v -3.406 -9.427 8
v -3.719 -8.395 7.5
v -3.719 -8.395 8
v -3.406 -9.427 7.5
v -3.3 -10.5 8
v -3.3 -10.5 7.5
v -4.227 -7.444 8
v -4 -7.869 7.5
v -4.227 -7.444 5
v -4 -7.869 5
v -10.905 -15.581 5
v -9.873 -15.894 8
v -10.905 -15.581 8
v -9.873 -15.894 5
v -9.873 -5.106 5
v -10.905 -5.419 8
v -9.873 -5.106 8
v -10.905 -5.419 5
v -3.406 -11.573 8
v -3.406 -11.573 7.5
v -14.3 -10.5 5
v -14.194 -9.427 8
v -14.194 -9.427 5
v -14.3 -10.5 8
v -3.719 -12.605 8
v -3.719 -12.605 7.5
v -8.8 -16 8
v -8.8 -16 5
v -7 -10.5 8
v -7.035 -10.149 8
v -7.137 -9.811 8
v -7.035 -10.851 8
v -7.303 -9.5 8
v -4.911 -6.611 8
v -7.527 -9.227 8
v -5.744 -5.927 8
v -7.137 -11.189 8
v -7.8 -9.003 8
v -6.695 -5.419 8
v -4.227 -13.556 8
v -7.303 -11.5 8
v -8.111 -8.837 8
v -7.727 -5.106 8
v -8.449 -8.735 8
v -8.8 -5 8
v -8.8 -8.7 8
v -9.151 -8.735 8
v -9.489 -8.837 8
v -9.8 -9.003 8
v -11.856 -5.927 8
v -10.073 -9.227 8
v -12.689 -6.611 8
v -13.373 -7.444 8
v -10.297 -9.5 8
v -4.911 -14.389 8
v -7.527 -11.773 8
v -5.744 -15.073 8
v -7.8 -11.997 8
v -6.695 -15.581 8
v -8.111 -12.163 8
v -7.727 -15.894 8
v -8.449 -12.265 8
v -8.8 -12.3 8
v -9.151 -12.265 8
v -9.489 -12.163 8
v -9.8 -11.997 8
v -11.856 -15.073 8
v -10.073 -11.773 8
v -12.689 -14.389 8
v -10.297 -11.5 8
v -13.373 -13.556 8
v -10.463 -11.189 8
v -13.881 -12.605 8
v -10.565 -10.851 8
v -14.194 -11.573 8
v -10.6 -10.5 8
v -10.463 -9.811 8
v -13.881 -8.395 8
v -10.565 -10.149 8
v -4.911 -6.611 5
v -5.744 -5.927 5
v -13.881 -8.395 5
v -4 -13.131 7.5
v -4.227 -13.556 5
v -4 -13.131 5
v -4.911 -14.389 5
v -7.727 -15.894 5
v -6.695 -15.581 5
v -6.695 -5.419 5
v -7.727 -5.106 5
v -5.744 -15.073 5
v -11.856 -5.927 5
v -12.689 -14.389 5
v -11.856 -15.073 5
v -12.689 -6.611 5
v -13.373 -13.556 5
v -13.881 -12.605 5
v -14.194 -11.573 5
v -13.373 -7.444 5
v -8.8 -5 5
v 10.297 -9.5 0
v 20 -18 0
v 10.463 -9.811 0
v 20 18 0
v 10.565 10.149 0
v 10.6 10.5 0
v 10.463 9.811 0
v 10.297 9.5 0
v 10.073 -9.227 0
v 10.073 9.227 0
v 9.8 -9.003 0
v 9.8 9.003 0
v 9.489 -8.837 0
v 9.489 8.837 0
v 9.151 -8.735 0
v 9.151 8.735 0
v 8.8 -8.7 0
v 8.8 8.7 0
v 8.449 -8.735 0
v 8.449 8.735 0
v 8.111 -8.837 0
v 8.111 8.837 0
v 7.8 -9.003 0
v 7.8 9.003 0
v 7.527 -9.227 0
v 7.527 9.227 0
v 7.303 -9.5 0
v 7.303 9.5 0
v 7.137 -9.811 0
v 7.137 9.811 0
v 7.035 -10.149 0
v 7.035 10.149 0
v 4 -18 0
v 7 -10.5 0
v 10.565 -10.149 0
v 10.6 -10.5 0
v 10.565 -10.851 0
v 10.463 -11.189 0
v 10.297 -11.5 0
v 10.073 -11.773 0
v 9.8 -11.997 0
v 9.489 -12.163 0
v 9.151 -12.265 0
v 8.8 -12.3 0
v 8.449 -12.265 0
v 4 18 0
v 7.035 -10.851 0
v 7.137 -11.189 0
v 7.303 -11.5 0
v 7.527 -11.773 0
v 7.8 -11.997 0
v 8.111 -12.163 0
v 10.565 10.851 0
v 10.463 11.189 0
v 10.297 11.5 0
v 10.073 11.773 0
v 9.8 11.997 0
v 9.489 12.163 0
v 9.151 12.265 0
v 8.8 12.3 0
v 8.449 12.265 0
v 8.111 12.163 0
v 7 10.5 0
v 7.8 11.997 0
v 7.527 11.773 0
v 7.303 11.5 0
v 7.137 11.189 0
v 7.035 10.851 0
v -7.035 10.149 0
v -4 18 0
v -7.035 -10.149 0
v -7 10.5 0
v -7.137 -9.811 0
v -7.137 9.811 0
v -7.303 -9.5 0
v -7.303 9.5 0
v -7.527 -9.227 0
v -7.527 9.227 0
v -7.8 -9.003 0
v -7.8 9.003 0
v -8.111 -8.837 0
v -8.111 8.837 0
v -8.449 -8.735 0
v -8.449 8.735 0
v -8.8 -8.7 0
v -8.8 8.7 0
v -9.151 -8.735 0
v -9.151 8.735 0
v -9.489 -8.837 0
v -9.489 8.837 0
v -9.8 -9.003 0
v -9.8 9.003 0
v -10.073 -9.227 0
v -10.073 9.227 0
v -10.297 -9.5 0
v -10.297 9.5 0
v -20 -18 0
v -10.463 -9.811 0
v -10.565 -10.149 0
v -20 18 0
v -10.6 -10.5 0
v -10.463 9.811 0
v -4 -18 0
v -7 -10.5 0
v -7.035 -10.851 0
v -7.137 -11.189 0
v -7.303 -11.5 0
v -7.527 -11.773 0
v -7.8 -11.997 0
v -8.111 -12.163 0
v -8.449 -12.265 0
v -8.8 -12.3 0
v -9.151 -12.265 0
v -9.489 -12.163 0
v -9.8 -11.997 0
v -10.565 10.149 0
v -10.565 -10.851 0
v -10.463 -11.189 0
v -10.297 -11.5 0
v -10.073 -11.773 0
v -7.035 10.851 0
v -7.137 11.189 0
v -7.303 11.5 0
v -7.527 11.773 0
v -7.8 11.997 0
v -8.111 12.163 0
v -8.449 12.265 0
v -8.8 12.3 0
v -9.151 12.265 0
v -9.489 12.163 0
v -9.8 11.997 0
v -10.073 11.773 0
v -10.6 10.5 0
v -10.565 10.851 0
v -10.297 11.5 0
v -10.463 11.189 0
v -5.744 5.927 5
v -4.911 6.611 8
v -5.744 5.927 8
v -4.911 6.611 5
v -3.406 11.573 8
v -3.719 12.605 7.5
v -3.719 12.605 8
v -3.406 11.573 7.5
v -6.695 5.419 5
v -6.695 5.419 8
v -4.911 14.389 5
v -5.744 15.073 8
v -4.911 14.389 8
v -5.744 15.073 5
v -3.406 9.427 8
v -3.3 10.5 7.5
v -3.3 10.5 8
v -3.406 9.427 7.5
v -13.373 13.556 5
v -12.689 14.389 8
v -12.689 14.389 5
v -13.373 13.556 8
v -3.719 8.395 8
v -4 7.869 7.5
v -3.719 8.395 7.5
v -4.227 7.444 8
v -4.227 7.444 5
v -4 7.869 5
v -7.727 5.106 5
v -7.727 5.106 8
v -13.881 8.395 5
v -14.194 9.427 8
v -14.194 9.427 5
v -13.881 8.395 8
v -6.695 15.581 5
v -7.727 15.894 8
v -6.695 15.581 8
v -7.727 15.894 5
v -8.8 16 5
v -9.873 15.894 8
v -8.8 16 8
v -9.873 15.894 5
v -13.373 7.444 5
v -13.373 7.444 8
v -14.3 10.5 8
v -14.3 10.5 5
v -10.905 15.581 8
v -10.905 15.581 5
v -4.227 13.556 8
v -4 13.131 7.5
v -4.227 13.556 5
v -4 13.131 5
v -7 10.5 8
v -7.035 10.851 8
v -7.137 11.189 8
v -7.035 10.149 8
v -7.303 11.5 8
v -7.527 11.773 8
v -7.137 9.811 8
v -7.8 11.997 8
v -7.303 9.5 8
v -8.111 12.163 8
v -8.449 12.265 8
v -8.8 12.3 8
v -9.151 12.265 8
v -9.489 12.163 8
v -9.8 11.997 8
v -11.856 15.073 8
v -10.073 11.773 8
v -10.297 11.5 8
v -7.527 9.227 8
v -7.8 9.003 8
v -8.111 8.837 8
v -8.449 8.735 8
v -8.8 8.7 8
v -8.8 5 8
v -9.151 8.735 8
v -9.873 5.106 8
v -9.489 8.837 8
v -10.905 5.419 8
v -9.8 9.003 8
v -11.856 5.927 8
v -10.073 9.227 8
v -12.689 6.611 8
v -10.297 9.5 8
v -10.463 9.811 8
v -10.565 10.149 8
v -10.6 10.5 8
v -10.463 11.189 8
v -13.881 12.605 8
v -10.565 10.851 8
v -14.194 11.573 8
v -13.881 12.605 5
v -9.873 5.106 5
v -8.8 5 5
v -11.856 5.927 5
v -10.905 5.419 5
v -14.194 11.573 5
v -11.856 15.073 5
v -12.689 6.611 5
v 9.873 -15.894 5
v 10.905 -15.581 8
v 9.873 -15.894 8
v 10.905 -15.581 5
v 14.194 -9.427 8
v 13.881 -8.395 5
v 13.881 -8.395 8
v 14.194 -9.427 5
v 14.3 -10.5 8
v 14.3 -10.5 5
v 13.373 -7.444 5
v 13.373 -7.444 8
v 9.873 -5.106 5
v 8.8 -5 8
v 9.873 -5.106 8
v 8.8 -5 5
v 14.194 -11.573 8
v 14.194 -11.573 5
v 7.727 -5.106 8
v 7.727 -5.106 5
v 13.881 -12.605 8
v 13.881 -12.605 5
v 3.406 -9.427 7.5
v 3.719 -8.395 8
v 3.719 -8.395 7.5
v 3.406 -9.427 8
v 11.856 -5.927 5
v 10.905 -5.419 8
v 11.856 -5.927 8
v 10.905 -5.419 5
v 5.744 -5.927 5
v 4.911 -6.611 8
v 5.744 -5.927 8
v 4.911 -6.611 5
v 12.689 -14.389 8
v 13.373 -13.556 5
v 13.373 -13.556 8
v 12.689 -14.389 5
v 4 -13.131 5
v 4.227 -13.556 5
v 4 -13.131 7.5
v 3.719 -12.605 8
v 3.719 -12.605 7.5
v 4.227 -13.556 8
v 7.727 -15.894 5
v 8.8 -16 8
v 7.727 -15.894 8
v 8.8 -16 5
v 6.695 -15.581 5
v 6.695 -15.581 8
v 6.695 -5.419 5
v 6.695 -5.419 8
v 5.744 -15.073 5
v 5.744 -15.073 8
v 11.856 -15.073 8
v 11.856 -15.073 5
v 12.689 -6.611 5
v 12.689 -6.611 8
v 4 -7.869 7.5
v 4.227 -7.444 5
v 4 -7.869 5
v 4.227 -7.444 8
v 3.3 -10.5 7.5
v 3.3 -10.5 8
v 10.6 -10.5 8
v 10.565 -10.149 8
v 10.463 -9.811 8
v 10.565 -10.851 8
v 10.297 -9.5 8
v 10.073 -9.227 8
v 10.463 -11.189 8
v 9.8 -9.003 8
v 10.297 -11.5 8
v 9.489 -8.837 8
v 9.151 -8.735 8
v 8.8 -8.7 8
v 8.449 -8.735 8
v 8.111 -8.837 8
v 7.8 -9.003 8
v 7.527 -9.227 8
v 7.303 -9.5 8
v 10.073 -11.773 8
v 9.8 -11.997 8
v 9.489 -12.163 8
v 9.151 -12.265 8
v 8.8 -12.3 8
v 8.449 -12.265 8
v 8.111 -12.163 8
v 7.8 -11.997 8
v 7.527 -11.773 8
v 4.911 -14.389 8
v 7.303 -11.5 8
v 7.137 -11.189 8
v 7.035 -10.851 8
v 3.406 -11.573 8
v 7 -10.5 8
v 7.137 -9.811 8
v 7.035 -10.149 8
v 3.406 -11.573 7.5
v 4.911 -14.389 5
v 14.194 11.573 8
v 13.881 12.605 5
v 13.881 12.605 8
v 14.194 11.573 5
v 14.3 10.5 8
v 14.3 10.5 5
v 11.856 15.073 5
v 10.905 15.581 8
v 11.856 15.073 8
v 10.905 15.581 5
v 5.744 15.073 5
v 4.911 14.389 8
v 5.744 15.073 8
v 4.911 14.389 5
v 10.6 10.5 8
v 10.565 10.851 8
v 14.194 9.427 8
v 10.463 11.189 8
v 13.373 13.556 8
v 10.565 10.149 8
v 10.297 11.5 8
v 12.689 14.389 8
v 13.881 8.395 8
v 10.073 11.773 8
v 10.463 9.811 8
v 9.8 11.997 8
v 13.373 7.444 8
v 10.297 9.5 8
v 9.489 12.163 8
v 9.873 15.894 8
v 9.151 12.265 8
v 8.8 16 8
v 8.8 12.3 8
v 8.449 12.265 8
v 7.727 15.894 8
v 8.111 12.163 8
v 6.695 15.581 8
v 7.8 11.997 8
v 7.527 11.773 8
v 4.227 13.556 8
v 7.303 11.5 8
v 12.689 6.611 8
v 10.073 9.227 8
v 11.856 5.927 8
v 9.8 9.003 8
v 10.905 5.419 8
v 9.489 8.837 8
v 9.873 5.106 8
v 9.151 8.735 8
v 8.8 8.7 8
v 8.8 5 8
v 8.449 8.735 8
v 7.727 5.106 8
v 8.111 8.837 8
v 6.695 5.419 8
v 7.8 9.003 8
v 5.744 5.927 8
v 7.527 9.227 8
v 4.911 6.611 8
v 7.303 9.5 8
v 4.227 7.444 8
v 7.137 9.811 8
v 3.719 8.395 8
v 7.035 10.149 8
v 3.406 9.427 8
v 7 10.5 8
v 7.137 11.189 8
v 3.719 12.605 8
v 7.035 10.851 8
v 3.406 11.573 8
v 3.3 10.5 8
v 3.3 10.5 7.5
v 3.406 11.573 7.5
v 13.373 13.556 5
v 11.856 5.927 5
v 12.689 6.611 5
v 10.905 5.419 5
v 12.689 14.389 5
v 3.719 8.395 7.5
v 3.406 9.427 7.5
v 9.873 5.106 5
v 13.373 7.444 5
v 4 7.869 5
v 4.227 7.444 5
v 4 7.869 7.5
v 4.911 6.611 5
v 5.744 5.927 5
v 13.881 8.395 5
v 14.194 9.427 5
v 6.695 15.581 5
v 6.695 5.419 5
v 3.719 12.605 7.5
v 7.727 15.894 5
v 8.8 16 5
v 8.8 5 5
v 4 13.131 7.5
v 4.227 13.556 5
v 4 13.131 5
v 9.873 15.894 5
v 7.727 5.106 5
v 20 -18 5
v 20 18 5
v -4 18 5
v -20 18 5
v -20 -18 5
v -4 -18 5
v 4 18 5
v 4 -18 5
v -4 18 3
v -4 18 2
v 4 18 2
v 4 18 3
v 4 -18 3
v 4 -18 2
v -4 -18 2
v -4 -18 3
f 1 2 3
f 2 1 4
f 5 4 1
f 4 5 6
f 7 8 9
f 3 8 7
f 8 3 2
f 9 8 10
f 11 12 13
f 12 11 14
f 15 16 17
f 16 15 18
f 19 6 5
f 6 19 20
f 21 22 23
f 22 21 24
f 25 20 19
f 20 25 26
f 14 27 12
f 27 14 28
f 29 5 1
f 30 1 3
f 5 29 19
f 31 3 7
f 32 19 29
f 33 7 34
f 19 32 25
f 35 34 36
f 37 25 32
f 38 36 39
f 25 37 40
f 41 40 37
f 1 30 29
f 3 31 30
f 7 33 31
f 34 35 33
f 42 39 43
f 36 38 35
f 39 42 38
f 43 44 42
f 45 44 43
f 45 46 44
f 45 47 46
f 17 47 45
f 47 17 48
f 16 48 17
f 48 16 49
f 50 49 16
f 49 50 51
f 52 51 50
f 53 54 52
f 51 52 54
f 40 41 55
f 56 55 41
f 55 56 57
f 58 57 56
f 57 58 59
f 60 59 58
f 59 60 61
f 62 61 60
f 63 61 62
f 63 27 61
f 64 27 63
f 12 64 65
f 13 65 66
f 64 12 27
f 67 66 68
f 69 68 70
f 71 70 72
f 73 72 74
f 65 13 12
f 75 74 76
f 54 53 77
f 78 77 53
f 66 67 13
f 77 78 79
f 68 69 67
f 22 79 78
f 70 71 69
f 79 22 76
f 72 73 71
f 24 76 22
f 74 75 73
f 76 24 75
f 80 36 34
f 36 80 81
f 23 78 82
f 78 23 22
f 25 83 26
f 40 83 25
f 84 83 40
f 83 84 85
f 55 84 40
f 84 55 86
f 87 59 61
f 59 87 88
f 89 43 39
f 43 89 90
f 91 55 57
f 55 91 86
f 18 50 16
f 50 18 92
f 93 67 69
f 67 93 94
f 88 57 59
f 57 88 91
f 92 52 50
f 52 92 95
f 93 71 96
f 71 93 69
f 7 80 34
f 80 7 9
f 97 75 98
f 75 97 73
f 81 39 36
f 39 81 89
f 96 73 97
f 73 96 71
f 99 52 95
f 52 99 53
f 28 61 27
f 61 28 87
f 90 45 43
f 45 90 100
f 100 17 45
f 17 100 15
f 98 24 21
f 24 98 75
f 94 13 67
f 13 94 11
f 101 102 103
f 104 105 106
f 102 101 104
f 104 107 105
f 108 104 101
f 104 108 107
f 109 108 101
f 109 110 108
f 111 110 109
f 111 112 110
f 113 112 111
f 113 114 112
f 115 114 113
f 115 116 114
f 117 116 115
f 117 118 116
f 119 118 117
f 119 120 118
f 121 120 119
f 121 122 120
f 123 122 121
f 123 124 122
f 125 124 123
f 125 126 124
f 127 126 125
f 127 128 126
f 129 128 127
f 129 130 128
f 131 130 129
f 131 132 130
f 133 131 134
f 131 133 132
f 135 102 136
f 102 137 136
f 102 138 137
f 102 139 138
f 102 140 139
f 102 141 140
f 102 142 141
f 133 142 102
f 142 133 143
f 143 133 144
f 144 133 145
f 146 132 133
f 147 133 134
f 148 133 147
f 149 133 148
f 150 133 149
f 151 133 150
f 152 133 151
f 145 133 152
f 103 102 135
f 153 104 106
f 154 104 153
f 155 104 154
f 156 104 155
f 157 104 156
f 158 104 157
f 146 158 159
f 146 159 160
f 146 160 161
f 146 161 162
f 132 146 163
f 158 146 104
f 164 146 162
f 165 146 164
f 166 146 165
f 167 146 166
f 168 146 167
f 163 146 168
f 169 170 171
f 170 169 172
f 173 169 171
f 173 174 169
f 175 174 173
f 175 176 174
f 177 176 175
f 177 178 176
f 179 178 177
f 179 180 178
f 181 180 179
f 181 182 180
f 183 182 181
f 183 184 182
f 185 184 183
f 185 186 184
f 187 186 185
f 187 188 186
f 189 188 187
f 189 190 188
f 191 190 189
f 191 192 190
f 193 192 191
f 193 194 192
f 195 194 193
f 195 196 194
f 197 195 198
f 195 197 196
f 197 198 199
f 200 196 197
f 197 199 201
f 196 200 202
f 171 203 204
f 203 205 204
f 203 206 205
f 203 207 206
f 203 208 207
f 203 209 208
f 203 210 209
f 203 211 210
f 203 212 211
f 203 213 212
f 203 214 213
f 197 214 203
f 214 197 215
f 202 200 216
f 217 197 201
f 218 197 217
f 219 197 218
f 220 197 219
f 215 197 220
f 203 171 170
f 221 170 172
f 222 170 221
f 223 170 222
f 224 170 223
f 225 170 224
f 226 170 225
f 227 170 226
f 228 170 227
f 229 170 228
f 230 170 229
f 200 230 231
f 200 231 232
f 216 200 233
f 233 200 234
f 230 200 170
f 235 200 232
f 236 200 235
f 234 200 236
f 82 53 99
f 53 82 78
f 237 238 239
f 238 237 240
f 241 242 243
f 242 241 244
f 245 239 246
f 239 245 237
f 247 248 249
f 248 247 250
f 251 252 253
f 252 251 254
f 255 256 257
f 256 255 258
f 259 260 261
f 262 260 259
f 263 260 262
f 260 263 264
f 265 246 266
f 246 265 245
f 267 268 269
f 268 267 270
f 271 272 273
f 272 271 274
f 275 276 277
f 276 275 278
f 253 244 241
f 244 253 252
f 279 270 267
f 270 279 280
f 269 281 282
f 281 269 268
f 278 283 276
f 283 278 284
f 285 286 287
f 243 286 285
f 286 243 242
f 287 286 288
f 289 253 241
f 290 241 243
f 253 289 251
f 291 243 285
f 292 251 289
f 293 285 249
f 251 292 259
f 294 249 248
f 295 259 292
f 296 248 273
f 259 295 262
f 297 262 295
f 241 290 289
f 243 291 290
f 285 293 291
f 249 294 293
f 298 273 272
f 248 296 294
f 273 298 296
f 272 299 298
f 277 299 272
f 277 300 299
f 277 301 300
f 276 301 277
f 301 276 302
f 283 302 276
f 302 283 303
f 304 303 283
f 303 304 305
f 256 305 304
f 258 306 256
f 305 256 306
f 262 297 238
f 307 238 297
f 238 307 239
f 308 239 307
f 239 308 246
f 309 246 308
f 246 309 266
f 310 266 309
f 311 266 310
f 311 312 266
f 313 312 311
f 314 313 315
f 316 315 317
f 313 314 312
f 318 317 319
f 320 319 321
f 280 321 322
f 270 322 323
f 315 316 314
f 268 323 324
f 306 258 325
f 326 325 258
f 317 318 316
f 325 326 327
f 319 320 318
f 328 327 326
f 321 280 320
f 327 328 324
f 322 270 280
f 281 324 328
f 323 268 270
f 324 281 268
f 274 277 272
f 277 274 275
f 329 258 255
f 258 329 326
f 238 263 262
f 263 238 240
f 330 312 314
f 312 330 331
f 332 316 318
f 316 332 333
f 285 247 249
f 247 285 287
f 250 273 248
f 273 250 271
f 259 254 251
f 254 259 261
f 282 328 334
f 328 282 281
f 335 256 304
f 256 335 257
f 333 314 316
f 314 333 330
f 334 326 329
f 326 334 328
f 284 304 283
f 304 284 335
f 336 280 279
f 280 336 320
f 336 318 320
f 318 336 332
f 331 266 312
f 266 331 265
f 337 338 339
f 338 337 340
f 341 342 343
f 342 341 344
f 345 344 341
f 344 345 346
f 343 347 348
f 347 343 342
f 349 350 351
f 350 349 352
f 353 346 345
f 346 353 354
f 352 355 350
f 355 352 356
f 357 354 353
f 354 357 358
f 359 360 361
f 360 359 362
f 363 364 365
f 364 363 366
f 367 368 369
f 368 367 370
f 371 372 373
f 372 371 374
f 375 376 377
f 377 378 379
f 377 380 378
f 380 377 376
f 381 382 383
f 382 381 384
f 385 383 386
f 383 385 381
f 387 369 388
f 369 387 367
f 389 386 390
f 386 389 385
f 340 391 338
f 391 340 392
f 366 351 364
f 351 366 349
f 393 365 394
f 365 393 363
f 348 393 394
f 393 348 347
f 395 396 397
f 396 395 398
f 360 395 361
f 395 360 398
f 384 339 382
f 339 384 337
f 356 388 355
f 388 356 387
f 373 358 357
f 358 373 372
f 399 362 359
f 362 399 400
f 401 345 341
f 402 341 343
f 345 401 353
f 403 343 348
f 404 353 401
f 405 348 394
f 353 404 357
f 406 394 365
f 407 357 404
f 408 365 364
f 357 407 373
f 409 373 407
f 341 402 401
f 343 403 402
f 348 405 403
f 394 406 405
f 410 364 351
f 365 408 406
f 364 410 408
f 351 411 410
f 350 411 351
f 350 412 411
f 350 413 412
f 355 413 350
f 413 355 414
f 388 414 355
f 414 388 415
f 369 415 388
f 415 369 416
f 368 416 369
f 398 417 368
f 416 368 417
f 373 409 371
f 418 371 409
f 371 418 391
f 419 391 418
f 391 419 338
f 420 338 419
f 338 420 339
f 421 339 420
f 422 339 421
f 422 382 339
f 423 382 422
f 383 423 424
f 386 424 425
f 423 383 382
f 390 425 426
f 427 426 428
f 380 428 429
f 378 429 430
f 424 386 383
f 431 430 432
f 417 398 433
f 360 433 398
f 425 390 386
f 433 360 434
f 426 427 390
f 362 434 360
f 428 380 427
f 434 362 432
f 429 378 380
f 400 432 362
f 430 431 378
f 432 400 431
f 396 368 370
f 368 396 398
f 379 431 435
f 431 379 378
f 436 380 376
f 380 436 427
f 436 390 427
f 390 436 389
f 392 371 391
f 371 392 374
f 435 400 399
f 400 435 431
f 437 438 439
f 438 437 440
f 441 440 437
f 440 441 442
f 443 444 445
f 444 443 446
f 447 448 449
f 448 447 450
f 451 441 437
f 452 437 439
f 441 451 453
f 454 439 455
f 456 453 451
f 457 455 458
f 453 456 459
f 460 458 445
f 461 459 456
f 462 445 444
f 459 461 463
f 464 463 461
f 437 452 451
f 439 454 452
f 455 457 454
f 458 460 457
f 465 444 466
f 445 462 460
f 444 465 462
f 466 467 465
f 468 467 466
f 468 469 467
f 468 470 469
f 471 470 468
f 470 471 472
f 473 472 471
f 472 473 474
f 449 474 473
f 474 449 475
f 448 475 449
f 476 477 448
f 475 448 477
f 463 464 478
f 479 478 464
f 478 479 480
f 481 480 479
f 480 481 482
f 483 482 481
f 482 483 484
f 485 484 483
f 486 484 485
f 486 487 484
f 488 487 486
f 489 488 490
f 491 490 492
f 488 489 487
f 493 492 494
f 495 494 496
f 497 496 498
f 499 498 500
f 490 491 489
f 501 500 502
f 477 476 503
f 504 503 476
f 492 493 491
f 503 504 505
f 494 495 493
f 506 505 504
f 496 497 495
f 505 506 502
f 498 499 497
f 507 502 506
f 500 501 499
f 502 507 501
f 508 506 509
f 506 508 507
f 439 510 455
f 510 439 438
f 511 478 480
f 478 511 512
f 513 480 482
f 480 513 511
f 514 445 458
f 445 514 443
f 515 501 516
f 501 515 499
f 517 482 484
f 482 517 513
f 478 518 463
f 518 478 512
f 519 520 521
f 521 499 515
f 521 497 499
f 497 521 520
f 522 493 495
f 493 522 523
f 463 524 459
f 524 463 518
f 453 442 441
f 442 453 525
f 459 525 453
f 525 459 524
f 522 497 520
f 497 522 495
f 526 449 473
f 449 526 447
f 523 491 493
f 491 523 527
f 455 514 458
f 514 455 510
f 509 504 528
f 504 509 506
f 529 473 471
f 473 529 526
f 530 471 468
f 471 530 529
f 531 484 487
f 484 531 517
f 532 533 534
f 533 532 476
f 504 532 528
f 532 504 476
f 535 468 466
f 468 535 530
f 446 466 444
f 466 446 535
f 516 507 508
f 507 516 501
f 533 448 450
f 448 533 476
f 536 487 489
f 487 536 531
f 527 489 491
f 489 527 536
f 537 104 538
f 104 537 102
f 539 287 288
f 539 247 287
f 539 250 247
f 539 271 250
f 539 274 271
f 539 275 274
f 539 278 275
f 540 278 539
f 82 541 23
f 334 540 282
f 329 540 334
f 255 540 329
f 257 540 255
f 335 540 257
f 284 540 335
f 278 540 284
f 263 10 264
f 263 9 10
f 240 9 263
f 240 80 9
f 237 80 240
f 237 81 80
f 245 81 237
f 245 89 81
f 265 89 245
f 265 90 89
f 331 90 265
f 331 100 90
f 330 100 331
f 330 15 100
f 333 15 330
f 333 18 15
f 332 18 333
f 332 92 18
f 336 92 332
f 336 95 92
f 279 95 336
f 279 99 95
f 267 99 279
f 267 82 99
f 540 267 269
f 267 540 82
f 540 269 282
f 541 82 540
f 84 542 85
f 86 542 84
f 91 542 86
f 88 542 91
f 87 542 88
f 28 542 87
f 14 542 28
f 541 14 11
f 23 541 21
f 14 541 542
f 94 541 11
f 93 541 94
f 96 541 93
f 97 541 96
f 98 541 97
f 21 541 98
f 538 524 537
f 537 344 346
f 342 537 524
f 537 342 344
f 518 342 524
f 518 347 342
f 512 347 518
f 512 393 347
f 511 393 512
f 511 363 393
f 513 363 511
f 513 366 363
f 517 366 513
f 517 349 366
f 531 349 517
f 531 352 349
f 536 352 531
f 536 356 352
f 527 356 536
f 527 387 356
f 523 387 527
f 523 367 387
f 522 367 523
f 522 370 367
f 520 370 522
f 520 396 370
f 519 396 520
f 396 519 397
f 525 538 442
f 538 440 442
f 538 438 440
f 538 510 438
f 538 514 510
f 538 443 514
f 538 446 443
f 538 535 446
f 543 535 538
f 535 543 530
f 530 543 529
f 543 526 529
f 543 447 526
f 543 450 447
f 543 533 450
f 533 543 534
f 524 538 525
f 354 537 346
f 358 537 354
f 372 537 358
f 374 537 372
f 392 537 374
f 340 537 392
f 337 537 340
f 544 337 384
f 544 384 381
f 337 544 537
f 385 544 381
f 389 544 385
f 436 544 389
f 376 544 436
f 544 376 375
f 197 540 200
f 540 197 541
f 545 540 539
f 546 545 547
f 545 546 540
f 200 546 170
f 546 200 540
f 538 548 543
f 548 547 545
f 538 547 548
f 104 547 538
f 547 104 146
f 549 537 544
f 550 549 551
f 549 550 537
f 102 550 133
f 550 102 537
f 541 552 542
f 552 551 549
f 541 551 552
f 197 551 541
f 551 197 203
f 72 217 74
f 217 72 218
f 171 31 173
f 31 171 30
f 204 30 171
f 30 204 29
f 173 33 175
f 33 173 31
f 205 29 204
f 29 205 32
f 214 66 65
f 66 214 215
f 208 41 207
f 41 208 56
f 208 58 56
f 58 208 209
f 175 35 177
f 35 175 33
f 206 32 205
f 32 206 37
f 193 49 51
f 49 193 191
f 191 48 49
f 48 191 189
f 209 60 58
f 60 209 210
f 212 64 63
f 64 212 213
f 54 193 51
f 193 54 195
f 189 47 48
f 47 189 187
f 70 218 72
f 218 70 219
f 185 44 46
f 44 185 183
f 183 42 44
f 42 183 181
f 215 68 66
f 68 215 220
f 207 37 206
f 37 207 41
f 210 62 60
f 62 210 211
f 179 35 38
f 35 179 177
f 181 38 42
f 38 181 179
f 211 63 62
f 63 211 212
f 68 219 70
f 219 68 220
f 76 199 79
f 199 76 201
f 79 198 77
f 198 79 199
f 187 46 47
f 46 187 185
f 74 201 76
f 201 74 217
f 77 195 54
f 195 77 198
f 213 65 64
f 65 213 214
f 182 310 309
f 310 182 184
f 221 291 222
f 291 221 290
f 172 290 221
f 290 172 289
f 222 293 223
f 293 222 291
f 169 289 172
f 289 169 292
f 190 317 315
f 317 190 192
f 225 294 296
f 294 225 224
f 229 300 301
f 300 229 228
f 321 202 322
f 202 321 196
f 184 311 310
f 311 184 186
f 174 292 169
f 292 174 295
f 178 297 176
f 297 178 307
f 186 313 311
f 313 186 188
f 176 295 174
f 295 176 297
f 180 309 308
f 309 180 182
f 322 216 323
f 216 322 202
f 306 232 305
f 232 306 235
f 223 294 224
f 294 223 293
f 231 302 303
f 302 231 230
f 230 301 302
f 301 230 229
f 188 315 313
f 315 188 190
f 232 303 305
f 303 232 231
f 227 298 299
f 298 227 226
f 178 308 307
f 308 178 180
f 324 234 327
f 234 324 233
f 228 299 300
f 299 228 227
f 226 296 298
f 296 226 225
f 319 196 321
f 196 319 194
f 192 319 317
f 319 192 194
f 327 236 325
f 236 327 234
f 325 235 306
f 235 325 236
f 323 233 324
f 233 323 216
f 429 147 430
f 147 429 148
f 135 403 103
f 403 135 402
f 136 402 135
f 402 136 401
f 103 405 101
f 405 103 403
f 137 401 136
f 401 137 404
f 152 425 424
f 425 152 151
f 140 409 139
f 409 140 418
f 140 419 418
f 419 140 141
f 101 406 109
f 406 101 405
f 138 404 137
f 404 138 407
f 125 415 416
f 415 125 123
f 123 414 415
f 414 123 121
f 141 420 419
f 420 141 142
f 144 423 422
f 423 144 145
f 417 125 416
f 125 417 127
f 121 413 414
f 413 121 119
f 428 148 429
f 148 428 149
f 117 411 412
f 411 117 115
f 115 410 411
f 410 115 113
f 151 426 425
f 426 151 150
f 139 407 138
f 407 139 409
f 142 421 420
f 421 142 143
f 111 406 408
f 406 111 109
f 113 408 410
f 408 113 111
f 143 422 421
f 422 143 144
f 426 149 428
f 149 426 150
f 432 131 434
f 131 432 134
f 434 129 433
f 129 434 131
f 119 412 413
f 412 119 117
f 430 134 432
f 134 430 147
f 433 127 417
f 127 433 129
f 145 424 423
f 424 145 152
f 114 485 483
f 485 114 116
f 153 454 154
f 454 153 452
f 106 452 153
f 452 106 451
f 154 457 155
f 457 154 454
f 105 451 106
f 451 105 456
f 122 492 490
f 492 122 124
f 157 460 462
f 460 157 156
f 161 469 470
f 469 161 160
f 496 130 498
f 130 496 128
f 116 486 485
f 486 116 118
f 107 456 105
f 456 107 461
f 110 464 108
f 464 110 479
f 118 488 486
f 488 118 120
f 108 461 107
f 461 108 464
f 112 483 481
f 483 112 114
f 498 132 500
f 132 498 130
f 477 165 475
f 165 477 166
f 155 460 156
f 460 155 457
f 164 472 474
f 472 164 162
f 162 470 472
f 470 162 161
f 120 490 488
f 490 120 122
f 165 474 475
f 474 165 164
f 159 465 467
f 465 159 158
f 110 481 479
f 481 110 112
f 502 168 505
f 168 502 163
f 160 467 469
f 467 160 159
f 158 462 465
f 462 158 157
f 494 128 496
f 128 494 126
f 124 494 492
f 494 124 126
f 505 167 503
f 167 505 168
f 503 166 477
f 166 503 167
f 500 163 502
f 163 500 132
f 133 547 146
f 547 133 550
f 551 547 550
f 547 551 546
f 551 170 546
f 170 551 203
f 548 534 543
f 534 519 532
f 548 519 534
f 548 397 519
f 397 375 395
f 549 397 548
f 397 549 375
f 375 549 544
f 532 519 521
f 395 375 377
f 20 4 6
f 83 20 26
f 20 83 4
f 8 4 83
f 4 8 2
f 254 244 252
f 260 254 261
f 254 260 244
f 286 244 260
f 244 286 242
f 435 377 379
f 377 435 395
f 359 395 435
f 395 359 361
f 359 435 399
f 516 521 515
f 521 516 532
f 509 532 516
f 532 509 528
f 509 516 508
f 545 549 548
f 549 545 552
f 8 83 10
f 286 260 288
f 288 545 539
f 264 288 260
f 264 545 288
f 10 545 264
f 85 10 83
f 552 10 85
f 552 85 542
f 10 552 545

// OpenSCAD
$fn = 32;

// ----------------------------------------------------------------------
// Living hinge: 40 x 36 mm plates, 1 mm flexible web
// ----------------------------------------------------------------------

// --- parameters (mm) ---
plate_len = 16;           // plate length outside the web
plate_w = 36;             // plate width
thick = 5;                // plate thickness
web_half = 4;             // half width of the flex band
web_t = 1;                // flexible web thickness
web_z = 2;                // web position inside the thickness
boss_d = 11;              // screw boss diameter
boss_h = 8;               // screw boss height
boss_x = 8.8;             // screw boss distance from the web
screw_d = 3.6;            // screw hole

difference() {
  union() {
    /* one flat strip, later thinned at the middle */
    translate([-20, -18, 0]) cube([40, 36, 5]);
    /* screw bosses, sunk 0.5 mm into the plates */
    for (sx = [-8.8, 8.8]) {
      for (sy = [-10.5, 10.5]) {
        translate([sx, sy, 0]) cylinder(h = boss_h, d = boss_d);
      }
    }
  }
  /* channel from below: leaves the web on top of it */
  translate([-4, -20.5, -2.5]) cube([8, 41, 4.5]);
  /* channel from above: thins the web down to web_t */
  translate([-4, -20.5, 3]) cube([8, 41, 4.5]);
  /* screw holes through the bosses */
  for (sx = [-8.8, 8.8]) {
    for (sy = [-10.5, 10.5]) {
      translate([sx, sy, -2.5]) cylinder(h = boss_h + 5, d = screw_d);
    }
  }
}
